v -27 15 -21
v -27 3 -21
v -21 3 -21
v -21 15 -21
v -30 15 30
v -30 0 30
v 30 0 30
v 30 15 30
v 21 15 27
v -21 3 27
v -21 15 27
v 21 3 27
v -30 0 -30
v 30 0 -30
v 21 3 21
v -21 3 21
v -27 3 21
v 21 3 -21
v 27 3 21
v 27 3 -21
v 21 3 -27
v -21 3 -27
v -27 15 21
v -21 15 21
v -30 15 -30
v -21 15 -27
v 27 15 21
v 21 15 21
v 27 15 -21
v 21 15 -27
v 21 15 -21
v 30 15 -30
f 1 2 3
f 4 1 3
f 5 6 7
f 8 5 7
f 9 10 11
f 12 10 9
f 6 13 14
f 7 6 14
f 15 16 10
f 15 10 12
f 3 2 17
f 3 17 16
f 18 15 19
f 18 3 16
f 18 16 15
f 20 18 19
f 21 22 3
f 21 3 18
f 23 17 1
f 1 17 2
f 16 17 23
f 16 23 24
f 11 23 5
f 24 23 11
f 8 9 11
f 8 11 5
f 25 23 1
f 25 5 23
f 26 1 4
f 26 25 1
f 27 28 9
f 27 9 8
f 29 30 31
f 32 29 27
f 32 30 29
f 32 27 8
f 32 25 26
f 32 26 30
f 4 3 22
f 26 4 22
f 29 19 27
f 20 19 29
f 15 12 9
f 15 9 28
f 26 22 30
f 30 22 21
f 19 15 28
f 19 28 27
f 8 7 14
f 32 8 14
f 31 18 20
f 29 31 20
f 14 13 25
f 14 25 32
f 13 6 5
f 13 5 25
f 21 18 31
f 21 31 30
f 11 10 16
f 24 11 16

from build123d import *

# Parameters (mm, degrees)
SKETCH1_W            = 60
SKETCH1_H            = 60
BOSS_EXTRUDE1_DEPTH  = 15
SHELL1_T             = -3
SKETCH2_W            = 6
SKETCH2_H            = 6
BOSS_EXTRUDE2_DEPTH  = 12
LPATTERN1_COUNT      = 2
LPATTERN1_PITCH      = 48
LPATTERN1_COUNT_DIR2 = 2
LPATTERN1_PITCH_DIR2 = 48


with BuildPart() as part:
    # Sketch1 → Boss-Extrude1 (new body)
    with BuildSketch(Plane(origin=(0, 0, 0), x_dir=(1, 0, 0), z_dir=(0, 1, 0))):
        Rectangle(SKETCH1_W, SKETCH1_H)
    extrude(amount=BOSS_EXTRUDE1_DEPTH)

    # Shell1
    shell1_openings = [part.faces().sort_by_distance(p)[0] for p in [
        (0, 15, 0),
    ]]
    offset(amount=SHELL1_T, openings=shell1_openings, kind=Kind.INTERSECTION)

    # Sketch2 → Boss-Extrude2 (add)
    with BuildSketch(Plane(origin=(0, 3, 0), x_dir=(1, 0, 0), z_dir=(0, 1, 0))):
        with Locations((-24, 24)):
            Rectangle(SKETCH2_W, SKETCH2_H)
    boss_extrude2 = extrude(amount=BOSS_EXTRUDE2_DEPTH)

    # LPattern1: Boss-Extrude2 2 × 2
    with Locations(*[(i * LPATTERN1_PITCH, 0, j * LPATTERN1_PITCH_DIR2) for i in range(LPATTERN1_COUNT) for j in range(LPATTERN1_COUNT_DIR2) if (i, j) != (0, 0)]):
        add(boss_extrude2)


solid = part.part
